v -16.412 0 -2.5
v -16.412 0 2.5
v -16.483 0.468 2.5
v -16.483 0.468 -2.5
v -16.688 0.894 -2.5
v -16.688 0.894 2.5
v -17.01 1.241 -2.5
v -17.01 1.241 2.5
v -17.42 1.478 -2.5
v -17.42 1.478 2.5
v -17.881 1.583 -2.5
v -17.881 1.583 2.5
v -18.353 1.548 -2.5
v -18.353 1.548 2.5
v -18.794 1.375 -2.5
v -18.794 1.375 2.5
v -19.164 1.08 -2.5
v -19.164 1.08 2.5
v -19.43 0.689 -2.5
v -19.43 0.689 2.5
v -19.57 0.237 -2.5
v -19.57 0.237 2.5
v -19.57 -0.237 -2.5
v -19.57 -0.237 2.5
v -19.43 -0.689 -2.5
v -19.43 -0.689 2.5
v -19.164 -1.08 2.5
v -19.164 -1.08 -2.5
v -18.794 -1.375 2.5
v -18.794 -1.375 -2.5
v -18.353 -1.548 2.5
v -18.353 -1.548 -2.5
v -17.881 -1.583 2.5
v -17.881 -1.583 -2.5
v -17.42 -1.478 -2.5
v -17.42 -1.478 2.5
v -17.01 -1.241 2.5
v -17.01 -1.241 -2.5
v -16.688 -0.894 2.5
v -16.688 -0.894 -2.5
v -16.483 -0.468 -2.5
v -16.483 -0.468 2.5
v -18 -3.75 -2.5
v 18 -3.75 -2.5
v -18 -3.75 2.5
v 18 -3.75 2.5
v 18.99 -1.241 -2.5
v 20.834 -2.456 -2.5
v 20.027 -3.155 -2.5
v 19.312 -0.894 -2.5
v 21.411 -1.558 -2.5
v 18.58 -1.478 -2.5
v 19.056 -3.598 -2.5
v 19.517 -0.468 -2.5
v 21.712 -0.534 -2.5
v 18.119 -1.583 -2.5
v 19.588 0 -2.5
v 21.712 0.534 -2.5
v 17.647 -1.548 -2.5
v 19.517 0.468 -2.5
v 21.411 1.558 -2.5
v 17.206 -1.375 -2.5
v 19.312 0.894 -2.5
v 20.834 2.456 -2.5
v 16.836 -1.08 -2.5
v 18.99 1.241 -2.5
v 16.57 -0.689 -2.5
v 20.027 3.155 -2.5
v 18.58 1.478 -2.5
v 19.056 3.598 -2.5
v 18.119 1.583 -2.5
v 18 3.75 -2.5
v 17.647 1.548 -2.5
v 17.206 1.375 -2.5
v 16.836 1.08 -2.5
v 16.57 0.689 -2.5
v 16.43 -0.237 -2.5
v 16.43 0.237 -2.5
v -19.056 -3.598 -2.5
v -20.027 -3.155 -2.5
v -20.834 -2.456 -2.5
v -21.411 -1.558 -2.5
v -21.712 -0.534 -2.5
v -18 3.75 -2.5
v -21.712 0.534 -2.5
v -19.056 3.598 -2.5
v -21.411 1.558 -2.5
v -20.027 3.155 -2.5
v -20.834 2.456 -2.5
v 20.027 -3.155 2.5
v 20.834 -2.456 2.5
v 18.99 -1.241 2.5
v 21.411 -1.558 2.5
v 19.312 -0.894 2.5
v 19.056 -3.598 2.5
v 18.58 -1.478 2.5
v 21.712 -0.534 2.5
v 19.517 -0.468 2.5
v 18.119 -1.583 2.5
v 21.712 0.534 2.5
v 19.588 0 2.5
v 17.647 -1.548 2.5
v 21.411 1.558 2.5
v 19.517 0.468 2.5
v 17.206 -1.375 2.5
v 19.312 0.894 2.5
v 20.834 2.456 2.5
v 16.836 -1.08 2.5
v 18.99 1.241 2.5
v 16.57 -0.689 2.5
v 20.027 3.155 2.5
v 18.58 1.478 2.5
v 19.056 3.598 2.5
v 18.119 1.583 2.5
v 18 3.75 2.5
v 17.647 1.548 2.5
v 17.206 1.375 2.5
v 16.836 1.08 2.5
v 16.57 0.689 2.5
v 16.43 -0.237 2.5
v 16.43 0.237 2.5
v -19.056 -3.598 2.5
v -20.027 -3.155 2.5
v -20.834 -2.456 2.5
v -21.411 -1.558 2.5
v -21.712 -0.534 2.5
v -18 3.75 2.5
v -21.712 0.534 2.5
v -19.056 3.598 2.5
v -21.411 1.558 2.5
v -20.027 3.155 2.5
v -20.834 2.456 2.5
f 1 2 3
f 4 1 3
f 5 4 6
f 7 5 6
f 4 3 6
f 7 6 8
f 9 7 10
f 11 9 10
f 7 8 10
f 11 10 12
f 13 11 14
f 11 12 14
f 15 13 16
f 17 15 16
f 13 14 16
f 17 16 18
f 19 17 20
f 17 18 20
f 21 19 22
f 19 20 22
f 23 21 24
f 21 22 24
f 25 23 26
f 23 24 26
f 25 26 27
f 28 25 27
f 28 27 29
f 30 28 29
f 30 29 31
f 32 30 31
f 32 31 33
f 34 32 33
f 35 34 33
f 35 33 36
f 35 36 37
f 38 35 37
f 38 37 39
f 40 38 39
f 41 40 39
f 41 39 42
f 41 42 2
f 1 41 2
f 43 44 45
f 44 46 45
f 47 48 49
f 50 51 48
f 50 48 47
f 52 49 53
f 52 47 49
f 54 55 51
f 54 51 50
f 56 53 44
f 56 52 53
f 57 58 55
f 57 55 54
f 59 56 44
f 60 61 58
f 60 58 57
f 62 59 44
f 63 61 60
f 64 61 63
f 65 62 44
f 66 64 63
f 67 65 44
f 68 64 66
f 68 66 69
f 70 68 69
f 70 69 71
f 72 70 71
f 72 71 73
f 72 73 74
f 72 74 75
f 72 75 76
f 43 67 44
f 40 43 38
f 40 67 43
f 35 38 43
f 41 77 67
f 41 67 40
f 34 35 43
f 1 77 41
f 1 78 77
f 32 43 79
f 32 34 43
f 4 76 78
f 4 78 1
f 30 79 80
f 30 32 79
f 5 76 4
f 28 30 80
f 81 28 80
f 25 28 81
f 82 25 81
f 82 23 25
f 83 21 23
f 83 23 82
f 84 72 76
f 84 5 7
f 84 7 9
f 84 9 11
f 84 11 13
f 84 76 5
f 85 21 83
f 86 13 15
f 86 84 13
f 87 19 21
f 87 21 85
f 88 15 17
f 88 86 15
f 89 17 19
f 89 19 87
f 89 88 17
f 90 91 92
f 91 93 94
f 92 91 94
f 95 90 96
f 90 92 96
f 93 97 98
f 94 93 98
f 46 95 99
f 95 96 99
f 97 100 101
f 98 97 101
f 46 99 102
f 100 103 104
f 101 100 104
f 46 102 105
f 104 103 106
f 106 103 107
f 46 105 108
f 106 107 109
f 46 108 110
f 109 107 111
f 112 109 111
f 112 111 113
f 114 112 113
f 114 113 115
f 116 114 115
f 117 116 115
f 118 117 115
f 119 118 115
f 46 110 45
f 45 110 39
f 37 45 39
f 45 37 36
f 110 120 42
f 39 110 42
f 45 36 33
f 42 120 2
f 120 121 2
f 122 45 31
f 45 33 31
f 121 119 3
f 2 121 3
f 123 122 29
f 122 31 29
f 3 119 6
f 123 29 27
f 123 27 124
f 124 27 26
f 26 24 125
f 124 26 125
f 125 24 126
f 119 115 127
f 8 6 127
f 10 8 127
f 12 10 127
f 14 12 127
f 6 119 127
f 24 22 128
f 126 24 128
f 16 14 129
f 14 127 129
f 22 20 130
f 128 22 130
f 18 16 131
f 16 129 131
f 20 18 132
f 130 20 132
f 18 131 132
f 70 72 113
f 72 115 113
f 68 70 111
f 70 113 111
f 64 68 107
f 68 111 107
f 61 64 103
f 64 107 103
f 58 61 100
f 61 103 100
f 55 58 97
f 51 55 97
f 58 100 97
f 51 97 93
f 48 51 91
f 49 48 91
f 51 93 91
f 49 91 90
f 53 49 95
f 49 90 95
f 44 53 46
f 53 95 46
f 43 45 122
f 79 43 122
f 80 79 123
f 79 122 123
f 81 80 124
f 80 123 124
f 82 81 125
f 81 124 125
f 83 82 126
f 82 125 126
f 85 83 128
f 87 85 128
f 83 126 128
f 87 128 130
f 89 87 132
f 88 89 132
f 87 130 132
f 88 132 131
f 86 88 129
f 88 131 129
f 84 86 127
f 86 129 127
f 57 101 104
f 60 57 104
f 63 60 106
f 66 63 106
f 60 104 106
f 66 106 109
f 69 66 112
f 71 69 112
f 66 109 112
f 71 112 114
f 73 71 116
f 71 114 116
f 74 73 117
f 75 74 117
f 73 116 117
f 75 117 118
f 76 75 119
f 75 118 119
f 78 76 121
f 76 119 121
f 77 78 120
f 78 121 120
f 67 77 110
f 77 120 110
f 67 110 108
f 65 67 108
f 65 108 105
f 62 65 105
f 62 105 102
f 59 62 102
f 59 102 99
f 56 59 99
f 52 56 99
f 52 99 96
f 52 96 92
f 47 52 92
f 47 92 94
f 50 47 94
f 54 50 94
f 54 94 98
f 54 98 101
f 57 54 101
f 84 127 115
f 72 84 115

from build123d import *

# Parameters (mm, degrees)
BOSS_EXTRUDE1_DEPTH = 2.5
SKETCH2_R           = 1.5875
CUT_EXTRUDE1_DEPTH  = 23.630178965


with BuildPart() as part:
    # Sketch1 → Boss-Extrude1 (new, symmetric)
    with BuildSketch(Plane.XY):
        with BuildLine():
            Line((-18, 3.75), (18, 3.75))
            ThreePointArc((18, 3.75), (21.75, 0), (18, -3.75))
            Line((18, -3.75), (-18, -3.75))
            ThreePointArc((-18, -3.75), (-21.75, 0), (-18, 3.75))
        make_face()
    extrude(amount=BOSS_EXTRUDE1_DEPTH, both=True)

    # Sketch2 → Cut-Extrude1 (cut, through all)
    with BuildSketch(Plane.XY.offset(2.5)):
        with Locations((-18, 0)):
            Circle(SKETCH2_R)
        with Locations((18, 0)):
            Circle(SKETCH2_R)
    extrude(amount=-CUT_EXTRUDE1_DEPTH, mode=Mode.SUBTRACT)


solid = part.part
